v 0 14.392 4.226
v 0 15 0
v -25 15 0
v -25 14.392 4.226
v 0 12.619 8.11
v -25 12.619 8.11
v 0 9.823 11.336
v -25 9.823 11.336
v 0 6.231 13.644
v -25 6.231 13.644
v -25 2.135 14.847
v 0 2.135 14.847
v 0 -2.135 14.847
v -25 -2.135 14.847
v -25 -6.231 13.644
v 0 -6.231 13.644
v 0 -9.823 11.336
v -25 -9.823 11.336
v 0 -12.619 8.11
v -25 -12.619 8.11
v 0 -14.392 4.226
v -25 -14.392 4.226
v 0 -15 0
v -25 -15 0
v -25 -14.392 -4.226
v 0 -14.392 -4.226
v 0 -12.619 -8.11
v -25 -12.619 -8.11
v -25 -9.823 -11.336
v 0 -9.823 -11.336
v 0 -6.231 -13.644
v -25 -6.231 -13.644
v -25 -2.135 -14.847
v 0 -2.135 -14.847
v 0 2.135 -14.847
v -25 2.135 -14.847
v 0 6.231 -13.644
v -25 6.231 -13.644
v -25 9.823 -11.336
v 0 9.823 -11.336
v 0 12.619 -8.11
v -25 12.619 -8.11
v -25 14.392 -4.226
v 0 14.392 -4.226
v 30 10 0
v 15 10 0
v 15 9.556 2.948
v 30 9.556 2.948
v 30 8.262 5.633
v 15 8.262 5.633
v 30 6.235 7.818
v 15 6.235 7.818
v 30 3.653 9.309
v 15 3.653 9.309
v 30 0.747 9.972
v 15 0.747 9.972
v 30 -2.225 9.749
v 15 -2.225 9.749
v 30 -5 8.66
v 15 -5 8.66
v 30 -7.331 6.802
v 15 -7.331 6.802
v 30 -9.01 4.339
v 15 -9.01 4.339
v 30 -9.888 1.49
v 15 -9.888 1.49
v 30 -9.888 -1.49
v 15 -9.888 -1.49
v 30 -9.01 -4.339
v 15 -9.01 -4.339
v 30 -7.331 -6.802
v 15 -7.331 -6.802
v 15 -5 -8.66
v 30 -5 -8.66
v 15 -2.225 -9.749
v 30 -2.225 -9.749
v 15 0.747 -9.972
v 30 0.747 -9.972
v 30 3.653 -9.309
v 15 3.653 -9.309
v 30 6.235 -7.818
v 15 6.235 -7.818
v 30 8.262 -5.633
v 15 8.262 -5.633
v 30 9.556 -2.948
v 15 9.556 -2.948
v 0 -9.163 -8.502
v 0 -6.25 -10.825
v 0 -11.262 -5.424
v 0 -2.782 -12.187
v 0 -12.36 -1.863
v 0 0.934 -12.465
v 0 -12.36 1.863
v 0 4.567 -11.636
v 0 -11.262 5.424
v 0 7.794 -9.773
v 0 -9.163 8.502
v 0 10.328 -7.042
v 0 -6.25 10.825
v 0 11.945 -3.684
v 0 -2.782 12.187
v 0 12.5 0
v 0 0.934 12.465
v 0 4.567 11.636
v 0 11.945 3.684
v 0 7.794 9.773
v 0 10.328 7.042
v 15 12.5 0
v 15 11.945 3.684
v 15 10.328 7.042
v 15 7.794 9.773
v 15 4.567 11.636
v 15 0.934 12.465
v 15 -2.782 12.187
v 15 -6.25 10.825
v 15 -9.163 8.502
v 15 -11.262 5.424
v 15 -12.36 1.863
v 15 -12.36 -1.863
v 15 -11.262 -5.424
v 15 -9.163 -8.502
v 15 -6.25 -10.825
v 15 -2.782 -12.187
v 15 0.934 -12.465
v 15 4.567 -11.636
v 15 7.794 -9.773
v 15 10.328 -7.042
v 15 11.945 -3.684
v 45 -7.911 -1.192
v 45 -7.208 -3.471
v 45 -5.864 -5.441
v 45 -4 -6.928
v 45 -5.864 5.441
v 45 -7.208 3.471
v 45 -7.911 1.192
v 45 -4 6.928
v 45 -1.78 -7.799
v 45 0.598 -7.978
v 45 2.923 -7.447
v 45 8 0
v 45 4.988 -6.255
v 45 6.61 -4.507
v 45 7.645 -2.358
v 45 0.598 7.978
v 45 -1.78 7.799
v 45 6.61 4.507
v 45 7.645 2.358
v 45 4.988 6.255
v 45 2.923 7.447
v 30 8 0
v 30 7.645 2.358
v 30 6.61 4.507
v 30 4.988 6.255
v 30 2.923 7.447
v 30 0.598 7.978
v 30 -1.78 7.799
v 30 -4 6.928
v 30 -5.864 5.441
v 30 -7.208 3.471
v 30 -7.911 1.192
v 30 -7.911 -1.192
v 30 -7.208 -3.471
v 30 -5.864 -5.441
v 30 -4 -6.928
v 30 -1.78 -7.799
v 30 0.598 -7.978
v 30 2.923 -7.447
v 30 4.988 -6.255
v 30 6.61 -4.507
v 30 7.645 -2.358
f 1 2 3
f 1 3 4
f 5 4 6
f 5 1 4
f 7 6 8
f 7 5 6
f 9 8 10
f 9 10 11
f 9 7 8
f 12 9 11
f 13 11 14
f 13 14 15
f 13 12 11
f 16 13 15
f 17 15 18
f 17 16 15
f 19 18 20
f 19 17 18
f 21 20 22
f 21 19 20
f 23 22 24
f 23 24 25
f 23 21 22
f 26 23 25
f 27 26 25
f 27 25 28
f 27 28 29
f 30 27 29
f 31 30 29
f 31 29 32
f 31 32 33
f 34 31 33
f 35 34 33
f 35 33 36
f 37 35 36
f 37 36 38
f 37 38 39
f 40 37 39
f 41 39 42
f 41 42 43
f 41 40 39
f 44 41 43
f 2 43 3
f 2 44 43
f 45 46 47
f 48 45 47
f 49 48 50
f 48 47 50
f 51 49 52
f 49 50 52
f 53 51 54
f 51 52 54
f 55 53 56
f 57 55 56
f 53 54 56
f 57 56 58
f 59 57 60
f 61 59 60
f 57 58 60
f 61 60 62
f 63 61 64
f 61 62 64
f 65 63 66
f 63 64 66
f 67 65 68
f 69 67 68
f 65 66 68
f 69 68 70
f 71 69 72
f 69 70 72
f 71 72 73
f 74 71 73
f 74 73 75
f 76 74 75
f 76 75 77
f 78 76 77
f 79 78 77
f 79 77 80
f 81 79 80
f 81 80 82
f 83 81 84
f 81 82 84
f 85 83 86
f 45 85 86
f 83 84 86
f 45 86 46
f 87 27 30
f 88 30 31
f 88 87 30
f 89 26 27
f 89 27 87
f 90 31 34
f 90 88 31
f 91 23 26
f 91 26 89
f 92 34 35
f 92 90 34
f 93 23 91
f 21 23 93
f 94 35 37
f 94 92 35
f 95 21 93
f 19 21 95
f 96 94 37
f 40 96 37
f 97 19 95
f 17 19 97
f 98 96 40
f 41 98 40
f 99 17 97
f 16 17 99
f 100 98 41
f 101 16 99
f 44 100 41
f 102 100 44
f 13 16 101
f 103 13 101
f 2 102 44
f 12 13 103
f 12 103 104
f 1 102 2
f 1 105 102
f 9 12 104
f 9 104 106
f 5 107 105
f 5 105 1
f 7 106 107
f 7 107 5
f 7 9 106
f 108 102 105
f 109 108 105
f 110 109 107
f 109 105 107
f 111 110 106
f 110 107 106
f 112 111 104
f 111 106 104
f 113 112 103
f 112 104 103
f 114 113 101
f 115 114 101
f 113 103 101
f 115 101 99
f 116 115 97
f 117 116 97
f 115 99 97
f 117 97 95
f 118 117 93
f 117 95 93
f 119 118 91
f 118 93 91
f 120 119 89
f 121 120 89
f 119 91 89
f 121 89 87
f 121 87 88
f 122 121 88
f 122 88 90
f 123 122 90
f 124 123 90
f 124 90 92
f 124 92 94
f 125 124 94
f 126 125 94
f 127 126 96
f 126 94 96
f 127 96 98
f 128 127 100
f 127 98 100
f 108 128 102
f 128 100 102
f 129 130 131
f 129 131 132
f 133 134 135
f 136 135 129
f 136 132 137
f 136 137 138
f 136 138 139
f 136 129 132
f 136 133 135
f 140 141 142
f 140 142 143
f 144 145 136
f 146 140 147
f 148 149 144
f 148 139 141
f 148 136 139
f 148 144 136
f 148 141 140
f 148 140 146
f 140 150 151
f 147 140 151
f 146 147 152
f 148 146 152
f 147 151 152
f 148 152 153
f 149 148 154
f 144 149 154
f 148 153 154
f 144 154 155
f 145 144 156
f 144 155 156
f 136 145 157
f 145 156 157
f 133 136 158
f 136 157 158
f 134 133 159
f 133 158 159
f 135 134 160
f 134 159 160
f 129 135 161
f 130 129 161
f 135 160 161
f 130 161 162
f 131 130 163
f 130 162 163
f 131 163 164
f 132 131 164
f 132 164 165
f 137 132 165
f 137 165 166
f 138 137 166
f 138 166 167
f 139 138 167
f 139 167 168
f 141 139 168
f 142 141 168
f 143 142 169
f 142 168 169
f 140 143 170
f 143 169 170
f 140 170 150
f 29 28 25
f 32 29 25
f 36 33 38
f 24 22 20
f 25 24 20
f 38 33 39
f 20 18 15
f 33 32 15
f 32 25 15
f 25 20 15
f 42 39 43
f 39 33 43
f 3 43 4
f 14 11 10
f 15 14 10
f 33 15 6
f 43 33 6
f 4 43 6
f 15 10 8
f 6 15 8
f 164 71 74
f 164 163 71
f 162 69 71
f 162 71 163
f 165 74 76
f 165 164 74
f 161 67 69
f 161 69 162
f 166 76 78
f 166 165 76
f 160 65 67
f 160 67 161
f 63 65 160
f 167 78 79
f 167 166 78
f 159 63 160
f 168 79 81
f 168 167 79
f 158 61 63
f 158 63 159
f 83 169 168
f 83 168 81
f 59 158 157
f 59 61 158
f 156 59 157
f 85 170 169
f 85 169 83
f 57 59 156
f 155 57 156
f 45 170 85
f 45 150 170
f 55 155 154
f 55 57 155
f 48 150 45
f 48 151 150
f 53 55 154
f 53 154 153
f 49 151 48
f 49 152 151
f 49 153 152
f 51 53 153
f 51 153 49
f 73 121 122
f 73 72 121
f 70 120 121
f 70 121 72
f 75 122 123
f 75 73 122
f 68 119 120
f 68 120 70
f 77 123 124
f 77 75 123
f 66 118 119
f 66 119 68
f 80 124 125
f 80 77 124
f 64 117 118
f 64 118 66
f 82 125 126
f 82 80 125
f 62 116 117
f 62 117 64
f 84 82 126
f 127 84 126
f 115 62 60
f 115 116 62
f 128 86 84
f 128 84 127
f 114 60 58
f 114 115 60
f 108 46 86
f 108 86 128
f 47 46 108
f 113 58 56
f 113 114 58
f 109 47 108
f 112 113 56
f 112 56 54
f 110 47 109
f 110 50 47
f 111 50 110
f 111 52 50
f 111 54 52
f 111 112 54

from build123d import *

# Parameters (mm, degrees)
F0_R     = 15
F1_DEPTH = 25
F2_R     = 12.5
F3_DEPTH = 15
F4_R     = 10
F5_DEPTH = 15
F6_R     = 8
F7_DEPTH = 15


# Not quite as in the source:
# - the program builds the solid bodies; features that only make, move or delete a surface that nothing else refers to are left out


with BuildPart() as f1:
    # F0 (on Right) → F1 (new body)
    with BuildSketch(Plane.YZ):
        Circle(F0_R)
    extrude(amount=-F1_DEPTH)

    # F2 (on face) → F3 (join)
    with BuildSketch(Plane.YZ):
        Circle(F2_R)
    extrude(amount=F3_DEPTH)

    # F4 (on face) → F5 (join)
    with BuildSketch(Plane.YZ.offset(15)):
        Circle(F4_R)
    extrude(amount=F5_DEPTH)

    # F6 (on face) → F7 (join)
    with BuildSketch(Plane.YZ.offset(30)):
        Circle(F6_R)
    extrude(amount=F7_DEPTH)


solid = f1.part
